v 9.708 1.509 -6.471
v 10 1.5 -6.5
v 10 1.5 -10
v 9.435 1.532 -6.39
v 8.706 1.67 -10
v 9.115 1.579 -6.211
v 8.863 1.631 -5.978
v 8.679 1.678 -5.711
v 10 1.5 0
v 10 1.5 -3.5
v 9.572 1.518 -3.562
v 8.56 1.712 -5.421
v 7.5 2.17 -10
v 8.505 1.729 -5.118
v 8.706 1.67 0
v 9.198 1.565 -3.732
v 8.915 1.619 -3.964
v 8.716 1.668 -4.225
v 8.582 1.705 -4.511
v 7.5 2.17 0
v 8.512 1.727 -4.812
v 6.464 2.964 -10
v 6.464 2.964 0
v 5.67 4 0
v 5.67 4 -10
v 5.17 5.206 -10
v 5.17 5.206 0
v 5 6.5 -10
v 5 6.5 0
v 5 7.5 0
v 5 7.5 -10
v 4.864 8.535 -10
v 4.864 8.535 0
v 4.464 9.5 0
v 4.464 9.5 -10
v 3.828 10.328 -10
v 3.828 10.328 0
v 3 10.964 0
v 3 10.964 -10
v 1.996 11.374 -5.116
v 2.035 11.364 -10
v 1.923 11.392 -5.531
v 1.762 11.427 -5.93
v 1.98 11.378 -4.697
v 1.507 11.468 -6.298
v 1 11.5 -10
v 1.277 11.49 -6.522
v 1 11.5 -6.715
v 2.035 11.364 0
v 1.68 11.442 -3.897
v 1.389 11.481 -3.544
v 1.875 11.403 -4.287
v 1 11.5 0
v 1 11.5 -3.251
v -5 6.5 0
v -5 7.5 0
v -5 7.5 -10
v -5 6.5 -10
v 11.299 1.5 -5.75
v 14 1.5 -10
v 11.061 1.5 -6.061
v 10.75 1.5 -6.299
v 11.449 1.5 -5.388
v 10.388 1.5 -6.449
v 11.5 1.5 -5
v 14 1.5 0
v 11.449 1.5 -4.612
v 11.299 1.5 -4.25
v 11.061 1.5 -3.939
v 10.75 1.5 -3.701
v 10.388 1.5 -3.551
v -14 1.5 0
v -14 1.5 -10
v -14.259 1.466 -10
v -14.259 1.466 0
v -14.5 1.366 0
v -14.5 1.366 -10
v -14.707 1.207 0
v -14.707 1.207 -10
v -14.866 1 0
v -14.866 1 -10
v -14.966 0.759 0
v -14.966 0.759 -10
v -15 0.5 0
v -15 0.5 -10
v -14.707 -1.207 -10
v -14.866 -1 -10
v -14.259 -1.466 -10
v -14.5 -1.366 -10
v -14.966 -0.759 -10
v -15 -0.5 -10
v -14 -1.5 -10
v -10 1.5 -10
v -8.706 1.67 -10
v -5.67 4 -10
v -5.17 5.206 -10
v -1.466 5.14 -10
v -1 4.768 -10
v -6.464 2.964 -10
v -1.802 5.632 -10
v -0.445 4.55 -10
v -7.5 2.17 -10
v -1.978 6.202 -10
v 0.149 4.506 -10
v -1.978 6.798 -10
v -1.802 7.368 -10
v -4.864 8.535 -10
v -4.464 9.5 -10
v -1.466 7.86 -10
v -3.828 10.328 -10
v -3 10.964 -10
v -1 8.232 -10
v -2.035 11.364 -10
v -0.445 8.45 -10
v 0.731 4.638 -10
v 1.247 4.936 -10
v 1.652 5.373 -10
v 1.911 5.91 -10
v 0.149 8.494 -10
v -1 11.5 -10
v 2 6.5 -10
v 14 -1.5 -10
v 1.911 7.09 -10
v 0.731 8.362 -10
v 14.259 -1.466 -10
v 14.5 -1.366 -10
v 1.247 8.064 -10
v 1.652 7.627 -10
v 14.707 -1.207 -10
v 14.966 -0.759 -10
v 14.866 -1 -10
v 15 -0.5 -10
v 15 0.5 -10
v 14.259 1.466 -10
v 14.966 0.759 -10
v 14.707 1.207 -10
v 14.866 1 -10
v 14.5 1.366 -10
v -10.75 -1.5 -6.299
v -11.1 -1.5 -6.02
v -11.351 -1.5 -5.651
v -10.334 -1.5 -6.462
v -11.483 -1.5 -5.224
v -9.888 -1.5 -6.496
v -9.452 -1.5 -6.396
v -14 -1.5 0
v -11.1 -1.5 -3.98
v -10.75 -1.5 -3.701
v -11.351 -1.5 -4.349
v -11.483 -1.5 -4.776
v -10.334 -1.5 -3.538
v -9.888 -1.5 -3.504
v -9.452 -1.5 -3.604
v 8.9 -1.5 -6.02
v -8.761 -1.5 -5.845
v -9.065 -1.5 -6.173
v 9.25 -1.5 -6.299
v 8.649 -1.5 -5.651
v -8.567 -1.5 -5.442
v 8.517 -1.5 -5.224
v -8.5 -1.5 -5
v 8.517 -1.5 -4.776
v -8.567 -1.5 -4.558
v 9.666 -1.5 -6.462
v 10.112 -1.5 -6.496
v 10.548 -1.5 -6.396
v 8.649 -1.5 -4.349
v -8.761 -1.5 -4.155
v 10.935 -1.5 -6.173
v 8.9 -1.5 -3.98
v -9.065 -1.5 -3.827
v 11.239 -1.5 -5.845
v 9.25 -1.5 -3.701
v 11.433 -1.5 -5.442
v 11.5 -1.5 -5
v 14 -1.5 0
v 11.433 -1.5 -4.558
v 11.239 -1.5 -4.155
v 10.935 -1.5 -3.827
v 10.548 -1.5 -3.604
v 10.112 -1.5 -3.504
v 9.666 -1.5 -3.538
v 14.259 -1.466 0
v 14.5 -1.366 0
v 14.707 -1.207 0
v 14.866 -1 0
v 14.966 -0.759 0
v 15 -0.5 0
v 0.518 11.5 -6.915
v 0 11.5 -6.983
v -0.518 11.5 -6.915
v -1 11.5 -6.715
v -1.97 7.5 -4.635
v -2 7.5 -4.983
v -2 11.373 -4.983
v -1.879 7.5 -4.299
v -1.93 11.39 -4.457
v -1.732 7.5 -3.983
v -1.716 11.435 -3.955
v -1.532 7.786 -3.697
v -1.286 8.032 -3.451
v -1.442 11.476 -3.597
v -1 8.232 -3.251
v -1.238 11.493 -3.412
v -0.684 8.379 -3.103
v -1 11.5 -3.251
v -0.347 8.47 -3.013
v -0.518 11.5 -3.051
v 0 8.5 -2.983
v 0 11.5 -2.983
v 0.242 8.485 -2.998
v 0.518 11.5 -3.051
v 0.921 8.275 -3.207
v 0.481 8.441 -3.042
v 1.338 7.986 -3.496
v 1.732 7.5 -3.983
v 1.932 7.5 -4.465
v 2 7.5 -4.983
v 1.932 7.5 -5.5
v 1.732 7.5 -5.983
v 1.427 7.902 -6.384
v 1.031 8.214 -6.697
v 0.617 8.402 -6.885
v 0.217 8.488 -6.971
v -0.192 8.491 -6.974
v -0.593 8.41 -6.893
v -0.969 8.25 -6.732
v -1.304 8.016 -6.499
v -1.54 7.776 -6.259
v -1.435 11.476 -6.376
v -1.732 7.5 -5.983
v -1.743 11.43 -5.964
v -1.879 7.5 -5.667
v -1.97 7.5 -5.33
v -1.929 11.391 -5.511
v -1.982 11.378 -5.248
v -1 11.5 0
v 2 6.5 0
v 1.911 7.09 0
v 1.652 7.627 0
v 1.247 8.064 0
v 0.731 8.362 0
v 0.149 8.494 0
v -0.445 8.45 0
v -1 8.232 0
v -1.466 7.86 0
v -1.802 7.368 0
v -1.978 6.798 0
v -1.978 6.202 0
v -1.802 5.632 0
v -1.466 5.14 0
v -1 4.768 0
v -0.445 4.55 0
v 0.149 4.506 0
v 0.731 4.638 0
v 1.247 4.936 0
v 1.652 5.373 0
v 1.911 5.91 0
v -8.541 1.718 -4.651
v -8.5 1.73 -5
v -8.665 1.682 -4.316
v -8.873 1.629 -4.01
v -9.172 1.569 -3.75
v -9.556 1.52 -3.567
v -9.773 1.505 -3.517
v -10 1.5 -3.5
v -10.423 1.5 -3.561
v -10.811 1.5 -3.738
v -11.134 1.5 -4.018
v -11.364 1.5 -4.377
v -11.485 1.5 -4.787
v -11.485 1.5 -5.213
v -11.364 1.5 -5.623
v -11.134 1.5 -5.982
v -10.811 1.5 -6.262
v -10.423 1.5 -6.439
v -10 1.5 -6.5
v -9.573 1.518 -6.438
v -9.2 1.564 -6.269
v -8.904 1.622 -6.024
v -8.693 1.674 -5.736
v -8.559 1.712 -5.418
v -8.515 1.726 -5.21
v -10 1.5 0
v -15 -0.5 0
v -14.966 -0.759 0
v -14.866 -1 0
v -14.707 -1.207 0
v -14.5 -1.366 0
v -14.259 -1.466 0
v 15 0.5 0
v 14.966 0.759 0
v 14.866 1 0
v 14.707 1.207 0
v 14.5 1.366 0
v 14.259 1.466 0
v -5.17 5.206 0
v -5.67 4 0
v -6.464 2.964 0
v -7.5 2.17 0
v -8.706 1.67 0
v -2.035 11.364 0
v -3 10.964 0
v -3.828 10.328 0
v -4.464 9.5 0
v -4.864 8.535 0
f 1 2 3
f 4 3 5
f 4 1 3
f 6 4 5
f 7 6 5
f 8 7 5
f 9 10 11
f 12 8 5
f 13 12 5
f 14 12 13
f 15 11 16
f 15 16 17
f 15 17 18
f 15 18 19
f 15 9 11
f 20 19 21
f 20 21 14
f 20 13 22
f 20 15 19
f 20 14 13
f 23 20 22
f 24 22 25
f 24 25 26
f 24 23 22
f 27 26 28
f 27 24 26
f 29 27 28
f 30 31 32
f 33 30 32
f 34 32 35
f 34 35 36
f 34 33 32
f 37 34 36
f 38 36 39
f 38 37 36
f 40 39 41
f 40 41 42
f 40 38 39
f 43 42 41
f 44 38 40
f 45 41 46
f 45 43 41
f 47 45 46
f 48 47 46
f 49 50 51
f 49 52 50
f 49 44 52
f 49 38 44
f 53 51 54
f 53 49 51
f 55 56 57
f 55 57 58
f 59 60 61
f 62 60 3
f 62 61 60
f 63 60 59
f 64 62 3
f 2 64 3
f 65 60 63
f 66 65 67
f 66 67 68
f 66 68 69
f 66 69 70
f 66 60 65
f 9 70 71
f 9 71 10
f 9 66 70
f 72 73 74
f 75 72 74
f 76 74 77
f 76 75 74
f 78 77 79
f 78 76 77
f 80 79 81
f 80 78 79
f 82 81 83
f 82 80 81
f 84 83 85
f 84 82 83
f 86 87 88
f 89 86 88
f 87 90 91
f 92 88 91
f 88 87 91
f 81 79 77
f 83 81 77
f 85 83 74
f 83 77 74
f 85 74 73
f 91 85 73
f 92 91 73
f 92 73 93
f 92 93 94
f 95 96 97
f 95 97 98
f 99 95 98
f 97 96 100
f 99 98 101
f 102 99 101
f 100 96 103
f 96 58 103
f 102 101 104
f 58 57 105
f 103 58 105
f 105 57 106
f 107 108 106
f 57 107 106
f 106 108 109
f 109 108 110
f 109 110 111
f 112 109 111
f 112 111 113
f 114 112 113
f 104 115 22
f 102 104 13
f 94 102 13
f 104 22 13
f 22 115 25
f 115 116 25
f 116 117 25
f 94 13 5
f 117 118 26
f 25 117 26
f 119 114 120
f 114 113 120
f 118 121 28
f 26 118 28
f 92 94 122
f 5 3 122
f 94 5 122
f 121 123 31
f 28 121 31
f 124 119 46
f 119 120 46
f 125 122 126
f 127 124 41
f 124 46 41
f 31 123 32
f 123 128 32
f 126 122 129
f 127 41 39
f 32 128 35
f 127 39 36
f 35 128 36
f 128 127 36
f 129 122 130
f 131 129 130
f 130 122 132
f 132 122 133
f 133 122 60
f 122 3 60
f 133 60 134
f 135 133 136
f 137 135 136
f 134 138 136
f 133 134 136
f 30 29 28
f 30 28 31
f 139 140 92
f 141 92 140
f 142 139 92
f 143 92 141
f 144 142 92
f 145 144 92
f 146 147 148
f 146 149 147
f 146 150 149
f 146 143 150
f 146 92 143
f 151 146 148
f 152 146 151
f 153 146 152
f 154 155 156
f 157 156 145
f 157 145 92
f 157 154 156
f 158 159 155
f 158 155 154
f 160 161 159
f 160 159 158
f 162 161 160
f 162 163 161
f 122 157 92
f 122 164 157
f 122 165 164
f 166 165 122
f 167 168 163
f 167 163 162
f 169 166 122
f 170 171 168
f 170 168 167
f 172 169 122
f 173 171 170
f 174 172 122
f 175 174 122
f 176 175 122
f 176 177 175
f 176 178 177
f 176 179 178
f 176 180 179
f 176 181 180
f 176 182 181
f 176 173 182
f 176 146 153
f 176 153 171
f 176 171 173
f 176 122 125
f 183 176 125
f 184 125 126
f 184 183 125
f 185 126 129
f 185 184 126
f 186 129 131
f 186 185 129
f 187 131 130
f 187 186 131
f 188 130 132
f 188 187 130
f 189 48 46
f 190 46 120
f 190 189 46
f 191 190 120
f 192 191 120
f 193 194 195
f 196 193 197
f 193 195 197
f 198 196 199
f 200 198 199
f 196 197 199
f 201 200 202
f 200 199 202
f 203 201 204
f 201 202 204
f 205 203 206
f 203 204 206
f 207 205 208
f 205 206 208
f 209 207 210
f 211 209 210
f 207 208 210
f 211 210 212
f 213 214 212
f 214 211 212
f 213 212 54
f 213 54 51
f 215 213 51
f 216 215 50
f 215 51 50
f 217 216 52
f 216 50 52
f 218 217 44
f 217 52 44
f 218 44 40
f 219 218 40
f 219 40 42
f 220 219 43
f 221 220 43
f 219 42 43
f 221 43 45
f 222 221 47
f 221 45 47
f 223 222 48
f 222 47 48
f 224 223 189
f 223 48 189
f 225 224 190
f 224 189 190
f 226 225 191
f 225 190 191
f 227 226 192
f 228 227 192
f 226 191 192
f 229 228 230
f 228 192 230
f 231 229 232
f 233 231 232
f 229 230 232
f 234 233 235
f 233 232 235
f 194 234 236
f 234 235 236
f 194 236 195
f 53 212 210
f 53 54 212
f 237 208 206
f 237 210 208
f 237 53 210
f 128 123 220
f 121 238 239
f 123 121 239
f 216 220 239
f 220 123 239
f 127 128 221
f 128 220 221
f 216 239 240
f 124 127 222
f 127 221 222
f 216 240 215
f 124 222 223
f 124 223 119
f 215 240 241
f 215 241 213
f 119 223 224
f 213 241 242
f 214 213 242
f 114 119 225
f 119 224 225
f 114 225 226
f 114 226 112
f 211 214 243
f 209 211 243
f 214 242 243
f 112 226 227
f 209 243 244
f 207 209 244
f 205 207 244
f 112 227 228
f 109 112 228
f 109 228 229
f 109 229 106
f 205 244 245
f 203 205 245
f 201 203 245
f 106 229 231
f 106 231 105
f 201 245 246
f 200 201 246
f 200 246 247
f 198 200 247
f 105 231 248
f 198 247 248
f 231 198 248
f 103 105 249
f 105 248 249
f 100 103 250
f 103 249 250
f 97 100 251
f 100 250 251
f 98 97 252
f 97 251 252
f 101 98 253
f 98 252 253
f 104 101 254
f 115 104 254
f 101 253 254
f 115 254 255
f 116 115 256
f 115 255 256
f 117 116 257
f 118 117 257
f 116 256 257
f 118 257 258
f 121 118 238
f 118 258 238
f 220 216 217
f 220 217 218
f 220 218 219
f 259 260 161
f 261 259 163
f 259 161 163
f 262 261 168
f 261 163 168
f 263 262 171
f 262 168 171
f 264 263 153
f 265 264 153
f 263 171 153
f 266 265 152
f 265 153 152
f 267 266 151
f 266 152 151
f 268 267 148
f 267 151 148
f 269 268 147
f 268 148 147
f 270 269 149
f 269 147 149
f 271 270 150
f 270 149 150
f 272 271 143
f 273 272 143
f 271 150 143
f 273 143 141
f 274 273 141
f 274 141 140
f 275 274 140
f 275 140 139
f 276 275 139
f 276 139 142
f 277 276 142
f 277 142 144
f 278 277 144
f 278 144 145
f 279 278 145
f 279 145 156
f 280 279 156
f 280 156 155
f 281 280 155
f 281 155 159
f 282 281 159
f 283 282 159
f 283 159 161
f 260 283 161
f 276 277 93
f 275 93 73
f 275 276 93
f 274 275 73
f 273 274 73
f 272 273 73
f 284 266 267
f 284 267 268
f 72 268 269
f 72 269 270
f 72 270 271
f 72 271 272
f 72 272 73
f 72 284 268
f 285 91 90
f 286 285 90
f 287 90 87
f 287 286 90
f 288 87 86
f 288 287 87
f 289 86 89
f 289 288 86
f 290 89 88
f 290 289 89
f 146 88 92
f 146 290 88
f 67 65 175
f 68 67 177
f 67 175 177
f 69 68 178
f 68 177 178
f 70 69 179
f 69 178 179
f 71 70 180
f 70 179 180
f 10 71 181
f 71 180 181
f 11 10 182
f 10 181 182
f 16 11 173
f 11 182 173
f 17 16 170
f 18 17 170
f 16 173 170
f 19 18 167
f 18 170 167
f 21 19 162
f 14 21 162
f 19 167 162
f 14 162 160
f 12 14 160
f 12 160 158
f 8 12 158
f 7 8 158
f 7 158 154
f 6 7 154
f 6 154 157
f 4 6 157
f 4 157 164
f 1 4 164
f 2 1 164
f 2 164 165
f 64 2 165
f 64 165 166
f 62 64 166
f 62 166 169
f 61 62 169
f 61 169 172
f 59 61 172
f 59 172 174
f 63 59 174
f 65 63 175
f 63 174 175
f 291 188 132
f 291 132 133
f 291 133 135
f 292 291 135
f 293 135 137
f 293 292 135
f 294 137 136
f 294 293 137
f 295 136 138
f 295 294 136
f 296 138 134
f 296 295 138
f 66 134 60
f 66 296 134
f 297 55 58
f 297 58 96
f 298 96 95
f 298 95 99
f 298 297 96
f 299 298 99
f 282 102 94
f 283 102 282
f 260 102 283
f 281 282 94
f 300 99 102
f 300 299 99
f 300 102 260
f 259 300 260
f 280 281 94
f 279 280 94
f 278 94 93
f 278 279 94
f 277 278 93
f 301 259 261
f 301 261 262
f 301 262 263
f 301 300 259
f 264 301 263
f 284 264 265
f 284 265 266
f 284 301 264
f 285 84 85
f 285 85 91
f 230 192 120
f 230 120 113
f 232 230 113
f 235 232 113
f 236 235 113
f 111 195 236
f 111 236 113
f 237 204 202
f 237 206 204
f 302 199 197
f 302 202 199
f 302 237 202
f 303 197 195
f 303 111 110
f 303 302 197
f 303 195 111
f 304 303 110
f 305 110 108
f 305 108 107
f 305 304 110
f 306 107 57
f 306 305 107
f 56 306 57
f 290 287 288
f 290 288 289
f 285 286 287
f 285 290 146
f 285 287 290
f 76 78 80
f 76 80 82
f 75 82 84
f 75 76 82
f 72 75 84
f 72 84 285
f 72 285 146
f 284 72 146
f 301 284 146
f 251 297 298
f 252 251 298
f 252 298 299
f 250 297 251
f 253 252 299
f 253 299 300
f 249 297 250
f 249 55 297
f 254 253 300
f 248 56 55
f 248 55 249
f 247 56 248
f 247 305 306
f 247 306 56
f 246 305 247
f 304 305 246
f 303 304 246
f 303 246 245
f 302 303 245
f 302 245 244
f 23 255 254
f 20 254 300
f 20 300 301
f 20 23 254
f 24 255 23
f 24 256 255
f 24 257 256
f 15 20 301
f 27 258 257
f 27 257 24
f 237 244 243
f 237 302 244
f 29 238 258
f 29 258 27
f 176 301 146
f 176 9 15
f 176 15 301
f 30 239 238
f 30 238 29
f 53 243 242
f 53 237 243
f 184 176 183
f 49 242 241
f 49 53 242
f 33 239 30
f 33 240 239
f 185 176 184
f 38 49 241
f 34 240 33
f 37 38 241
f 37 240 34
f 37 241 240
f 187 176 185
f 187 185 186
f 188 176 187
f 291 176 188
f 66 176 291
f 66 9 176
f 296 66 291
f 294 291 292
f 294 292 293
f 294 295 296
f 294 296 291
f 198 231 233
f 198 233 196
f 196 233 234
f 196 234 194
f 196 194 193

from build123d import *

# Parameters (mm, degrees)
F0_R     = 2
F1_DEPTH = 10
F2_R     = 2
F3_DEPTH = 4
F4_R     = 1.5
F5_DEPTH = 4


with BuildPart() as f1:
    # F0 (on Top) → F1 (new body)
    with BuildSketch(Plane.XY):
        with BuildLine():
            Line((-14, -1.5), (14, -1.5))
            ThreePointArc((14, -1.5), (14.707107, -1.207107), (15, -0.5))
            Line((15, -0.5), (15, 0.5))
            ThreePointArc((15, 0.5), (14.707107, 1.207107), (14, 1.5))
            Line((14, 1.5), (10, 1.5))
            ThreePointArc((10, 1.5), (6.464466, 2.964466), (5, 6.5))
            Line((5, 6.5), (5, 7.5))
            ThreePointArc((5, 7.5), (3.828427, 10.328427), (1, 11.5))
            Line((1, 11.5), (-1, 11.5))
            ThreePointArc((-1, 11.5), (-3.828427, 10.328427), (-5, 7.5))
            Line((-5, 7.5), (-5, 6.5))
            ThreePointArc((-5, 6.5), (-6.464466, 2.964466), (-10, 1.5))
            Line((-10, 1.5), (-14, 1.5))
            ThreePointArc((-14, 1.5), (-14.707107, 1.207107), (-15, 0.5))
            Line((-15, 0.5), (-15, -0.5))
            ThreePointArc((-15, -0.5), (-14.707107, -1.207107), (-14, -1.5))
        make_face()
        with Locations((0, 6.5)):
            Circle(F0_R, mode=Mode.SUBTRACT)
    extrude(amount=-F1_DEPTH)

    # F2 (on face) → F3 (cut)
    with BuildSketch(Plane(origin=(0, 11.5, 0), x_dir=(-1, 0, 0), z_dir=(0, 1, 0))):
        with Locations((0, -4.982779)):
            Circle(F2_R)
    extrude(amount=-F3_DEPTH, mode=Mode.SUBTRACT)

    # F4 (on face) → F5 (cut)
    with BuildSketch(Plane.XZ.offset(1.5)):
        with Locations((10, -5)):
            Circle(F4_R)
        with Locations((-10, -5)):
            Circle(F4_R)
    extrude(amount=-F5_DEPTH, mode=Mode.SUBTRACT)


solid = f1.part
